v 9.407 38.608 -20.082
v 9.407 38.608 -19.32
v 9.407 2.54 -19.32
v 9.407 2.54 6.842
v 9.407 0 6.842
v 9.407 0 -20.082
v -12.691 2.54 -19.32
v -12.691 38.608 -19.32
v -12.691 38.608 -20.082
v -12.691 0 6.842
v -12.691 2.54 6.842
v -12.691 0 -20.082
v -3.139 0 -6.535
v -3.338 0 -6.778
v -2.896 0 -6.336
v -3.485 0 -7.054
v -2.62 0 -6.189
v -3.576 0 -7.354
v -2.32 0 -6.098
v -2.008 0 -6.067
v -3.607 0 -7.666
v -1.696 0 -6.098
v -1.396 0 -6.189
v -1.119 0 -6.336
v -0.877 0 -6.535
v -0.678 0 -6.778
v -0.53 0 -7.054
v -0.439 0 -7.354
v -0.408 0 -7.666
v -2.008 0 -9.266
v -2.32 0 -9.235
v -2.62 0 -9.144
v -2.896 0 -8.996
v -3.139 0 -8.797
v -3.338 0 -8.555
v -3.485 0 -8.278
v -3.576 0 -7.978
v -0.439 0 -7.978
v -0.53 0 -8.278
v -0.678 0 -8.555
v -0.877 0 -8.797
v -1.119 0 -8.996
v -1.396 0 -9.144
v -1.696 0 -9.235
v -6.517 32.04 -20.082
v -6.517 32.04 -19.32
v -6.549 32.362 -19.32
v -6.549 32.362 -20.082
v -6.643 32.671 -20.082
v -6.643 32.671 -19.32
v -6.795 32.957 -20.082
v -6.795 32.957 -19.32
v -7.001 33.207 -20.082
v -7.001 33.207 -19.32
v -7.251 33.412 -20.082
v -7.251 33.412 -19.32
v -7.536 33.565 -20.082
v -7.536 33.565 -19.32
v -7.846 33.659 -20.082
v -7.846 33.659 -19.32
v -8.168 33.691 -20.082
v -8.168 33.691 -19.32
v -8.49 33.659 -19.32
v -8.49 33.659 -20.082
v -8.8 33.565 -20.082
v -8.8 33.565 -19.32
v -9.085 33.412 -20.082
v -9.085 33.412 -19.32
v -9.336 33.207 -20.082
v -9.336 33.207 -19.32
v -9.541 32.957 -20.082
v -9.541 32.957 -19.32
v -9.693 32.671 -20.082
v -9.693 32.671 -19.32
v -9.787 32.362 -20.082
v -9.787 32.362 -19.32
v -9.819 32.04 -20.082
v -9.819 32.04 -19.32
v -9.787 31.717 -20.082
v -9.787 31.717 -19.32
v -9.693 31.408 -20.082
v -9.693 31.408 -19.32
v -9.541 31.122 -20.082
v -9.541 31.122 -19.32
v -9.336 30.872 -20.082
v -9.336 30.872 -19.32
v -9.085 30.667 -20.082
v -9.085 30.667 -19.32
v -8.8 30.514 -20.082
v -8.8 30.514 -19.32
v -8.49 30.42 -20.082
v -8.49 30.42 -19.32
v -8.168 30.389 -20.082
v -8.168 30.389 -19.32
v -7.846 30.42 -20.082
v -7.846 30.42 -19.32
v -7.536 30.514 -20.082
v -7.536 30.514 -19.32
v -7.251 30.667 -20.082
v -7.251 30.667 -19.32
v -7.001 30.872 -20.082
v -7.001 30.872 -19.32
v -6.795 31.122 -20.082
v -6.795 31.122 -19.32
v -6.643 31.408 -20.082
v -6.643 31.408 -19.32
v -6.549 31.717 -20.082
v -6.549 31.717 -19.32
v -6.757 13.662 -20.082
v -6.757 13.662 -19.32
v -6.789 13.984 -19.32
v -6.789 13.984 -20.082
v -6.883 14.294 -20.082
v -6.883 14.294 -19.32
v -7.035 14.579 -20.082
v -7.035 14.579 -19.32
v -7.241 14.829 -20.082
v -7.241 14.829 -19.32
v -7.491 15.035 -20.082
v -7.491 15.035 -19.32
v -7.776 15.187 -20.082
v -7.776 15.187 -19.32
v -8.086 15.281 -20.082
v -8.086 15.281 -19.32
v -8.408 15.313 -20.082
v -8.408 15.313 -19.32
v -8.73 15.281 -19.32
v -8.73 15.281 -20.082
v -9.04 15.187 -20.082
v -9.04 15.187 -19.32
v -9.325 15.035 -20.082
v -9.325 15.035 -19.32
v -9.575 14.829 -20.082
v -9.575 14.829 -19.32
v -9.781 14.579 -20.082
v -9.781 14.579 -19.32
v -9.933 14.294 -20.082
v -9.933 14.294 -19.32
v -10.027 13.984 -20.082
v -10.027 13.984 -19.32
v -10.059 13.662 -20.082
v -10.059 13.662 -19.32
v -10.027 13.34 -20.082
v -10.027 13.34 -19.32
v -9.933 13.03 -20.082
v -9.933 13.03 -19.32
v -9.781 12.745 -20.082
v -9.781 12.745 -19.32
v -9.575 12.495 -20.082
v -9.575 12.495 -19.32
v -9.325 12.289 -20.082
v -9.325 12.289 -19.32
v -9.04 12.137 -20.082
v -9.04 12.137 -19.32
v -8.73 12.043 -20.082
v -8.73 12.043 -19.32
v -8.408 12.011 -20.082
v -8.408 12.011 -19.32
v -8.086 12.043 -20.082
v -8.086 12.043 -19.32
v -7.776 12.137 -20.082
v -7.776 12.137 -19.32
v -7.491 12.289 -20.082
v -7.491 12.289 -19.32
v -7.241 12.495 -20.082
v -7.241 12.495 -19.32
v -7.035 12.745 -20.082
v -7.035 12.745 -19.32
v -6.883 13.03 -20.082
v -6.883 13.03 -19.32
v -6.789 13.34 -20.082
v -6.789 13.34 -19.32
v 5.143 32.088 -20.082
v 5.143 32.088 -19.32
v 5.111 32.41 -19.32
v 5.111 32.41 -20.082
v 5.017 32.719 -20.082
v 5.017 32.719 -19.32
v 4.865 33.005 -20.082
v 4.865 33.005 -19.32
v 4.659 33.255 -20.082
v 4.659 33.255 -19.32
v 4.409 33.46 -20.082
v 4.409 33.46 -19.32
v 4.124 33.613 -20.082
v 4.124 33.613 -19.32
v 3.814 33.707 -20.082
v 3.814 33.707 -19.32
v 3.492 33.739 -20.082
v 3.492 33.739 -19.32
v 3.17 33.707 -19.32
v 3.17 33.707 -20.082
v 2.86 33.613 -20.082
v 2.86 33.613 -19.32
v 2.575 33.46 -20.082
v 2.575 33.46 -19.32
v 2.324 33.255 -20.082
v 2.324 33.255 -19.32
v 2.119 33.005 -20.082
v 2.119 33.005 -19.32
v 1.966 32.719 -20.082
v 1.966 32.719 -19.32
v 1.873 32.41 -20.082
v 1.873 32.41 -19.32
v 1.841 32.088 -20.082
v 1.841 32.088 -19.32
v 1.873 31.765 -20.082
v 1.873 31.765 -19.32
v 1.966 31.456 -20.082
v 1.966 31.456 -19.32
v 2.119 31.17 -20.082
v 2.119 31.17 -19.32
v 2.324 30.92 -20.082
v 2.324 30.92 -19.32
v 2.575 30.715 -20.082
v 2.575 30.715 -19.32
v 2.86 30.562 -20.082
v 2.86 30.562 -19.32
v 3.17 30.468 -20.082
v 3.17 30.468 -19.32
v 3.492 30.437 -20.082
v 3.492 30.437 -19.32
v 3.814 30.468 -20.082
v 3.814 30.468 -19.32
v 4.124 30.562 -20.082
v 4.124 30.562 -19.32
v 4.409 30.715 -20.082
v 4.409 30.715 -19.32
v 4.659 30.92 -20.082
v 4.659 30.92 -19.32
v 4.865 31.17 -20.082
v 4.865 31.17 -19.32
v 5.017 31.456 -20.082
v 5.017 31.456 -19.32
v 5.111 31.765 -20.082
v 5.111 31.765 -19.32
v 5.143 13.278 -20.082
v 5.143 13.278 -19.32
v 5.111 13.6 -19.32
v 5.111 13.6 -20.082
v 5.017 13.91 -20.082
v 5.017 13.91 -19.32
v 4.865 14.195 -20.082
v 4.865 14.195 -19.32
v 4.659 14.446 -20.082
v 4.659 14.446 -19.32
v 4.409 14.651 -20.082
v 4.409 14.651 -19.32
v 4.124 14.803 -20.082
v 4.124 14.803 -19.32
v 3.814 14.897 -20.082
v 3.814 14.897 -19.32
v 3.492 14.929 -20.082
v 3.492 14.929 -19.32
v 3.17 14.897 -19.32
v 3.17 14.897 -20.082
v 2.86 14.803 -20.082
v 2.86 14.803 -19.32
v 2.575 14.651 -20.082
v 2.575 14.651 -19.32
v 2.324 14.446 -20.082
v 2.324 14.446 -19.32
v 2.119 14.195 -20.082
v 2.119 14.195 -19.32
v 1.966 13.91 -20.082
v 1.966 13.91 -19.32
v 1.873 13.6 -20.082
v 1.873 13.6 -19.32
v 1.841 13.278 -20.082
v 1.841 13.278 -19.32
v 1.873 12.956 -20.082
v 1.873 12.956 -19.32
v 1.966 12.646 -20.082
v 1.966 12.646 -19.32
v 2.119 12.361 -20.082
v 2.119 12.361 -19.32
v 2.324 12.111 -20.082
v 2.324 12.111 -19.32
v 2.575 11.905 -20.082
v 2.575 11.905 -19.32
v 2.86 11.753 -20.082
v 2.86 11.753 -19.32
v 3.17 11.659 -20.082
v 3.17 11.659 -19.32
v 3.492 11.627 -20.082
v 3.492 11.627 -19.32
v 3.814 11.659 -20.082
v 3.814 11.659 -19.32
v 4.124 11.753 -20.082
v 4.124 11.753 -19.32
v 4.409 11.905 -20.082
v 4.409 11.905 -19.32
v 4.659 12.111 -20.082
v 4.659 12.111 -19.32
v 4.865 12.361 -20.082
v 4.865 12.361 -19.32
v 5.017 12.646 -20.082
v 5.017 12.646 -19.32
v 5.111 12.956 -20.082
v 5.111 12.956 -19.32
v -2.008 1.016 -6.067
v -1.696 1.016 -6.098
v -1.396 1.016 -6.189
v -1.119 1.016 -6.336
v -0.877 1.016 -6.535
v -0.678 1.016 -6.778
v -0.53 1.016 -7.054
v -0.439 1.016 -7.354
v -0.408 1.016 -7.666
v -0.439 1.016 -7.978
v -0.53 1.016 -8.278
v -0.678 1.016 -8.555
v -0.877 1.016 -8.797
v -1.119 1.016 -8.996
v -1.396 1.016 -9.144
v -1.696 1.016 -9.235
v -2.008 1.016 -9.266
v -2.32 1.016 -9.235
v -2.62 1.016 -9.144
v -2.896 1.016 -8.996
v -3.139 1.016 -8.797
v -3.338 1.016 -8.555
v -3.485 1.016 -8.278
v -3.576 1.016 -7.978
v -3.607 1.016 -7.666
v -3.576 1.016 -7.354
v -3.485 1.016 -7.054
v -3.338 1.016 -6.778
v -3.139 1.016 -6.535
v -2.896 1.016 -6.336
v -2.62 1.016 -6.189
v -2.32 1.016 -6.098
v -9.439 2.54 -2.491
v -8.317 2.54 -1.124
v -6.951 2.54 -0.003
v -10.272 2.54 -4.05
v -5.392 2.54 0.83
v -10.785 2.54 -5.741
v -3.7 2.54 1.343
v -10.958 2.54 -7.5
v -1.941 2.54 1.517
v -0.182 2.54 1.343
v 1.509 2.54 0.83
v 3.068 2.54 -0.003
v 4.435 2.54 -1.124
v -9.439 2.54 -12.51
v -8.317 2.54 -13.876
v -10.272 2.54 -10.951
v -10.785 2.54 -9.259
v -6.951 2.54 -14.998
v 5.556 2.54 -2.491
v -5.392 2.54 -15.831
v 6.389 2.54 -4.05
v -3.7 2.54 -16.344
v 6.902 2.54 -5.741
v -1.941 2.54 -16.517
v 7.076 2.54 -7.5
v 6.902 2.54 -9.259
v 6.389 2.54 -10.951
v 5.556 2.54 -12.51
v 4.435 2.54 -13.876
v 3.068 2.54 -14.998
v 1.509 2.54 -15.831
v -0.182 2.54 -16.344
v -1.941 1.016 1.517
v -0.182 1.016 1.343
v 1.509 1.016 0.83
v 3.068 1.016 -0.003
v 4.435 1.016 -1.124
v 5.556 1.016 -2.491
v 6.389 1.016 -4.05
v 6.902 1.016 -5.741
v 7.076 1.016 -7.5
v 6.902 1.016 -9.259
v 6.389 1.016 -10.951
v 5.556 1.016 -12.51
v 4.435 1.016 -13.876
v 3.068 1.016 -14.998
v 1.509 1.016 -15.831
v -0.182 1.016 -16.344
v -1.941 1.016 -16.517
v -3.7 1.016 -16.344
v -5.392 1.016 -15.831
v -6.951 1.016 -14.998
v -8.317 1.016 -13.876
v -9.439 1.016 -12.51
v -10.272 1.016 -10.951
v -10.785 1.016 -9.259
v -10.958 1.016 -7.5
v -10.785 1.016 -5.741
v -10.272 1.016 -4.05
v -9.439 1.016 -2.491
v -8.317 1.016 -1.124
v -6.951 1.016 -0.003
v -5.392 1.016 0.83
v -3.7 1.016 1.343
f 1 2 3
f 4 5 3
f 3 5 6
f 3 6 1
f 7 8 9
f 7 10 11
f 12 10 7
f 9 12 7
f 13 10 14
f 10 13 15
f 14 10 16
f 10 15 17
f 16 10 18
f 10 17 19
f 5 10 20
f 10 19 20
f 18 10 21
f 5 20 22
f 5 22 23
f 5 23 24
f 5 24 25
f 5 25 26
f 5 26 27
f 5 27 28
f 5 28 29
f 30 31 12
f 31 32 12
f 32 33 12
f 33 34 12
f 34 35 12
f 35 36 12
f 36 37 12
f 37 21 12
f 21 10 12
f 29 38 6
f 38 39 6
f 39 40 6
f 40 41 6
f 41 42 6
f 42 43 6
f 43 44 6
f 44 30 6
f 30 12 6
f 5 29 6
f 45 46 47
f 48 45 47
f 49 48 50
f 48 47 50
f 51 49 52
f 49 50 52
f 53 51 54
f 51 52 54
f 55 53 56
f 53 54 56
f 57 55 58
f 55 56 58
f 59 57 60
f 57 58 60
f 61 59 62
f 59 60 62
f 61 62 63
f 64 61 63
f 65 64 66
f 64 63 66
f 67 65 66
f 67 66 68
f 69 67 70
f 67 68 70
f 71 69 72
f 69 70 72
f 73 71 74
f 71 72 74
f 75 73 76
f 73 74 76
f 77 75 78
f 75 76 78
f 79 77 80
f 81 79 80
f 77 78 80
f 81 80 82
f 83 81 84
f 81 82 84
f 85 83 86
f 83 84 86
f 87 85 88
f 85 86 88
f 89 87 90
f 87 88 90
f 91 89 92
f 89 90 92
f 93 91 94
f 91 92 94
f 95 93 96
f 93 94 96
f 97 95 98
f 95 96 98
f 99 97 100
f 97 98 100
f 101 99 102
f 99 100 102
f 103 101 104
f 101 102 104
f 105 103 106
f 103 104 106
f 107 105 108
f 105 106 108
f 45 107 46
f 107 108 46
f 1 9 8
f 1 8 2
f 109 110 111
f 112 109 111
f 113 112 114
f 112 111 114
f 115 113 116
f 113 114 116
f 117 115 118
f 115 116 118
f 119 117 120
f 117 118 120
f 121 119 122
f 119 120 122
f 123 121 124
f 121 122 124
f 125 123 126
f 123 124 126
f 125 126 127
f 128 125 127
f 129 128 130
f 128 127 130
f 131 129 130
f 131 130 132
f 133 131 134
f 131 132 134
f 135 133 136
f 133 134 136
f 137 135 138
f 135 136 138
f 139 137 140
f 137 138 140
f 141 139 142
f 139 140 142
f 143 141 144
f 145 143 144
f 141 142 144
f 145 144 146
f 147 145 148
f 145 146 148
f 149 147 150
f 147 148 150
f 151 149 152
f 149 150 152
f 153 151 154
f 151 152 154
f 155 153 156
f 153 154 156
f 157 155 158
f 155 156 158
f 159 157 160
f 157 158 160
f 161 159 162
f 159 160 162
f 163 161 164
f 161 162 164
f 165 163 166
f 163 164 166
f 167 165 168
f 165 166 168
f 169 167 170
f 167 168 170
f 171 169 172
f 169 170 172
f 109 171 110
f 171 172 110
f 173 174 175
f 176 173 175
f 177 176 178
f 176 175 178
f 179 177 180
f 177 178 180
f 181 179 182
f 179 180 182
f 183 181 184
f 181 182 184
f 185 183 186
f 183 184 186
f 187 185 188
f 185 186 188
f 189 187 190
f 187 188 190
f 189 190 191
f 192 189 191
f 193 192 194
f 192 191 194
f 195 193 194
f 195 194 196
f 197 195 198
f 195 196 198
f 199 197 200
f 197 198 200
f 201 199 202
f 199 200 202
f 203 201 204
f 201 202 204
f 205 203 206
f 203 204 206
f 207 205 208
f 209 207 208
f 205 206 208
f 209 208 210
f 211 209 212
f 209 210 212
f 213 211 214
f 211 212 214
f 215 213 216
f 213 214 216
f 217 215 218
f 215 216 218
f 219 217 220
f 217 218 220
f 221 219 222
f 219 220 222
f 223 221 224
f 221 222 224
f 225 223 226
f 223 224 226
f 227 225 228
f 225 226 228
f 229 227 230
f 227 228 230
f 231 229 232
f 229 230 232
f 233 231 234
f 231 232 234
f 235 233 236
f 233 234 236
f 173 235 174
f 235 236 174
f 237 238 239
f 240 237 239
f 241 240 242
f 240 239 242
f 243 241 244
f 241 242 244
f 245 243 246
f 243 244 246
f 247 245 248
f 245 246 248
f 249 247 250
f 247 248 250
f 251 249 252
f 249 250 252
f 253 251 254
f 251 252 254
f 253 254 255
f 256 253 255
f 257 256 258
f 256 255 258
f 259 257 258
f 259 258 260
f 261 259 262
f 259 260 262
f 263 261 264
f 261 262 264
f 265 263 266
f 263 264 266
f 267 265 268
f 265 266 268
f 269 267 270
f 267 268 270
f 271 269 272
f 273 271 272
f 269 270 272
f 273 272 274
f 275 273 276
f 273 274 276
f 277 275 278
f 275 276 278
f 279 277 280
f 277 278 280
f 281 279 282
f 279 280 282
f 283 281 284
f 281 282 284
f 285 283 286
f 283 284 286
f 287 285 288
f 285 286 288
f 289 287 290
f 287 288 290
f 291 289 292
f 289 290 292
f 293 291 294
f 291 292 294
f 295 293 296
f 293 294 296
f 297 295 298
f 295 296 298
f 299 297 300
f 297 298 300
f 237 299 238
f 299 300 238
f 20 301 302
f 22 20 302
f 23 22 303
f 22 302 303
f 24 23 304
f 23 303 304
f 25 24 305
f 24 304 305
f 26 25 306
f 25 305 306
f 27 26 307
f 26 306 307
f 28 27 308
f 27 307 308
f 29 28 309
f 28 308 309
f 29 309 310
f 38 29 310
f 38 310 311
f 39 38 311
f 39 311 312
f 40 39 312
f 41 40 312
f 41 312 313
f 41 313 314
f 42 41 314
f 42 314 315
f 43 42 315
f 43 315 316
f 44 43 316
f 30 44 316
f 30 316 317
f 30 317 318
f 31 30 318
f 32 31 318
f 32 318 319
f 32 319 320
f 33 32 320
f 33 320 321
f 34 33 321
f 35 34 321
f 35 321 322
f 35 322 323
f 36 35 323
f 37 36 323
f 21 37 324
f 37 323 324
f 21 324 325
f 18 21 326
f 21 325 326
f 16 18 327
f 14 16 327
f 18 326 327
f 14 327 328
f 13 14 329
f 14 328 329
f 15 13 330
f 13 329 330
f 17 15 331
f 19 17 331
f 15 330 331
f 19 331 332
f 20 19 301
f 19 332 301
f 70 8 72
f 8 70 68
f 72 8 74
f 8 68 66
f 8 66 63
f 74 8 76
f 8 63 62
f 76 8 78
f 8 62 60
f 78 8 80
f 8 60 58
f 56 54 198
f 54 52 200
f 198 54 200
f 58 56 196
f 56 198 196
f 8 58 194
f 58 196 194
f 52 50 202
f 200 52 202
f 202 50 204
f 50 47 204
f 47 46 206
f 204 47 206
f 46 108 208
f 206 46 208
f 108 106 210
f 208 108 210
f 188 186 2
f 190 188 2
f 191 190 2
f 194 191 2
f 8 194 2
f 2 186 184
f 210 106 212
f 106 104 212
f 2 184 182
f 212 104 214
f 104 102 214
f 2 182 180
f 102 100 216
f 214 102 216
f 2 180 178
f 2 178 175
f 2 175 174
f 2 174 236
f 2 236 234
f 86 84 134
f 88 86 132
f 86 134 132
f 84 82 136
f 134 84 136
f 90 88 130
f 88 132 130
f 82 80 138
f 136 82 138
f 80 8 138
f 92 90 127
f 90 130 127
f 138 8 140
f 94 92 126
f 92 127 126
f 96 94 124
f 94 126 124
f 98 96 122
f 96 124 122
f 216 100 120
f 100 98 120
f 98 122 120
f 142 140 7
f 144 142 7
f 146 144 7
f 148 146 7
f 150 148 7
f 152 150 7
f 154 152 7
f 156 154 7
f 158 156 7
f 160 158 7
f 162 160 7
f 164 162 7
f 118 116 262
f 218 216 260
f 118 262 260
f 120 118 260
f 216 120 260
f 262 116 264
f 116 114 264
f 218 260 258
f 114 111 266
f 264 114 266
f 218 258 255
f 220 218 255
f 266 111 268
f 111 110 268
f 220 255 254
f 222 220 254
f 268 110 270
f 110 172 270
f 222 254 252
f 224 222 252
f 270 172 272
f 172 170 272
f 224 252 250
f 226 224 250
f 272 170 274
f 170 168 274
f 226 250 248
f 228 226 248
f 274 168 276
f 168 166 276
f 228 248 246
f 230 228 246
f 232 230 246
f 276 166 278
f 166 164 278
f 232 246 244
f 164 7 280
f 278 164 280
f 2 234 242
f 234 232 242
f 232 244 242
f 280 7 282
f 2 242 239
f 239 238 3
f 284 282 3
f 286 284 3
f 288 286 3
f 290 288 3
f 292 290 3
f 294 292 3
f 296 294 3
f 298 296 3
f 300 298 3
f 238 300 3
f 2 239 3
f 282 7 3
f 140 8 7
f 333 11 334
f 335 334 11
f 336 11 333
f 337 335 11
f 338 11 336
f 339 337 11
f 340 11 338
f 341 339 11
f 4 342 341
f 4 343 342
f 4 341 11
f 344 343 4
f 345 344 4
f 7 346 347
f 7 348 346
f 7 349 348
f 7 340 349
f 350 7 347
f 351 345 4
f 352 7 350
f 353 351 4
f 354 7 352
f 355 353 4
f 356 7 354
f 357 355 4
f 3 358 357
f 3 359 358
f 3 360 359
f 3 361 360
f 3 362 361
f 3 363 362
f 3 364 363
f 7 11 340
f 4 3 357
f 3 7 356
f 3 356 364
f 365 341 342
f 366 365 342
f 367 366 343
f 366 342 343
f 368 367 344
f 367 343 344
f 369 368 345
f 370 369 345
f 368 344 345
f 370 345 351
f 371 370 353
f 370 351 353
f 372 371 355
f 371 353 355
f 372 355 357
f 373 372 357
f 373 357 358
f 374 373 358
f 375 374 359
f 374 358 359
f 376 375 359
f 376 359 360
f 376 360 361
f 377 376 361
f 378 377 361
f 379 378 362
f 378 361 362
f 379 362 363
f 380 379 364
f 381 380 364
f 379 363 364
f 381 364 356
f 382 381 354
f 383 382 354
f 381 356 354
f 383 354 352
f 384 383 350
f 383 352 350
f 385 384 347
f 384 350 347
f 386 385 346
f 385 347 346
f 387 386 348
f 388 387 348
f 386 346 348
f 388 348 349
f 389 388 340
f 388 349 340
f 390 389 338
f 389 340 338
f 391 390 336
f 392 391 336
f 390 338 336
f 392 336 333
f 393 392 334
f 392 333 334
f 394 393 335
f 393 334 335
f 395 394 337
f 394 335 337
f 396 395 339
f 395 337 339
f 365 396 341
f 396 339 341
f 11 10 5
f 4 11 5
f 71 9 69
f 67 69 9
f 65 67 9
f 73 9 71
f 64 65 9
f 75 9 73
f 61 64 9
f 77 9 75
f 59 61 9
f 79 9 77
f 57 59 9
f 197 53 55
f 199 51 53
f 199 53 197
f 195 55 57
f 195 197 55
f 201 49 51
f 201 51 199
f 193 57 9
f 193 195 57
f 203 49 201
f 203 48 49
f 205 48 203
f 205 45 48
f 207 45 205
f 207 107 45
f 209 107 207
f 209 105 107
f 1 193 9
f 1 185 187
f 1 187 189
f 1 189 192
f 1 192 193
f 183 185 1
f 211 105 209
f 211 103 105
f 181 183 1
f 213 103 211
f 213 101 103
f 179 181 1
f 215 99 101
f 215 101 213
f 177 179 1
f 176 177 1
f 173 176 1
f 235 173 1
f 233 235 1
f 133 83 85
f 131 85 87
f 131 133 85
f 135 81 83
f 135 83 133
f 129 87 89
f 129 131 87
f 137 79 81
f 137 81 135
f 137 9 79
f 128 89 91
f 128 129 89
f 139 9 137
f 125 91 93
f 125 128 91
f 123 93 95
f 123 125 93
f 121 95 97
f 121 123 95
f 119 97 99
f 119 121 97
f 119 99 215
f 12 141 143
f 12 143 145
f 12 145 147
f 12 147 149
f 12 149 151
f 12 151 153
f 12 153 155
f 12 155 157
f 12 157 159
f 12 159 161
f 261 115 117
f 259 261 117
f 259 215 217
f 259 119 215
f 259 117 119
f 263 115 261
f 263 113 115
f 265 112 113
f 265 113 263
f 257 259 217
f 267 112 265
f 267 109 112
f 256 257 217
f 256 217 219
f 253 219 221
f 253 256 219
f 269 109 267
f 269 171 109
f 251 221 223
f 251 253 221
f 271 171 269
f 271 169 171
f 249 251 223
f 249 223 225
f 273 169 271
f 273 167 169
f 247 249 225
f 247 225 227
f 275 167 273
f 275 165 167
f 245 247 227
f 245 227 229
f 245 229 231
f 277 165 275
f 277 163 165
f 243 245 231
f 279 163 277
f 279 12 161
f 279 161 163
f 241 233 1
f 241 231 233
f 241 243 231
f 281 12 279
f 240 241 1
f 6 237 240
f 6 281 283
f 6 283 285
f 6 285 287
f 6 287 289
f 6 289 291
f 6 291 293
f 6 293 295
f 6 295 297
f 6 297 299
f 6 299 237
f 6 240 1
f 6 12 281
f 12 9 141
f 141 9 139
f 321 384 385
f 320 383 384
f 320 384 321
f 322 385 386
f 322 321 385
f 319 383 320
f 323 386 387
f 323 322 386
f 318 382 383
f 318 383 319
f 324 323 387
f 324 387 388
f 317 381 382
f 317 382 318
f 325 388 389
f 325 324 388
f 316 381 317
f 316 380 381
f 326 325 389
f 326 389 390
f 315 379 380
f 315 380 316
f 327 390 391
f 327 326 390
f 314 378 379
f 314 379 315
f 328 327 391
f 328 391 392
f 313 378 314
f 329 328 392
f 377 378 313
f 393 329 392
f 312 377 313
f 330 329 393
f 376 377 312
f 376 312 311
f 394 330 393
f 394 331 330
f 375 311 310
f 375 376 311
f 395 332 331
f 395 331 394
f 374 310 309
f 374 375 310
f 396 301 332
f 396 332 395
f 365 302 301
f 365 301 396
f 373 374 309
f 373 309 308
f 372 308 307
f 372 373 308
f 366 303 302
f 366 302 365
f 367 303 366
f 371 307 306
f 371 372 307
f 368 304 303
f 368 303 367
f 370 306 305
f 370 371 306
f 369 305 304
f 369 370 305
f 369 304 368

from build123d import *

# Parameters (mm, degrees)
SKETCH1_W           = 22.098
SKETCH1_H           = 26.924
BOSS_EXTRUDE1_DEPTH = 2.54
SKETCH2_W           = 22.098
SKETCH2_H           = 0.762
BOSS_EXTRUDE2_DEPTH = 36.068
SKETCH4_R           = 1.651
CUT_EXTRUDE1_DEPTH  = 0.762
SKETCH3_R           = 9.017
CUT_EXTRUDE2_DEPTH  = 1.524
SKETCH5_R           = 1.599485458
CUT_EXTRUDE3_DEPTH  = 1.27
SKETCH6_R           = 1.651
CUT_EXTRUDE4_DEPTH  = 0.762


with BuildPart() as part:
    # Sketch1 → Boss-Extrude1 (new body)
    with BuildSketch(Plane(origin=(0, 0, 0), x_dir=(1, 0, 0), z_dir=(0, 1, 0))):
        with Locations((-1.642418919, 6.620304054)):
            Rectangle(SKETCH1_W, SKETCH1_H)
    extrude(amount=BOSS_EXTRUDE1_DEPTH)

    # Sketch2 → Boss-Extrude2 (add)
    with BuildSketch(Plane(origin=(0, 2.54, 0), x_dir=(1, 0, 0), z_dir=(0, 1, 0))):
        with Locations((-1.642418919, 19.701304054)):
            Rectangle(SKETCH2_W, SKETCH2_H)
    extrude(amount=BOSS_EXTRUDE2_DEPTH)

    # Sketch4 → Cut-Extrude1 (cut)
    with BuildSketch(Plane.XY.offset(-19.320304054)):
        with Locations((-8.168147535, 32.039555002)):
            Circle(SKETCH4_R)
    extrude(amount=-CUT_EXTRUDE1_DEPTH, mode=Mode.SUBTRACT)

    # Sketch3 → Cut-Extrude2 (cut)
    with BuildSketch(Plane(origin=(0, 2.54, 0), x_dir=(1, 0, 0), z_dir=(0, 1, 0))):
        with Locations(Location((-1.941286503, 7.500303052, 0), (0, 0, 270))):
            Circle(SKETCH3_R)
    extrude(amount=-CUT_EXTRUDE2_DEPTH, mode=Mode.SUBTRACT)

    # Sketch5 → Cut-Extrude3 (cut)
    with BuildSketch(Plane(origin=(0, 1.016, 0), x_dir=(1, 0, 0), z_dir=(0, 1, 0))):
        with Locations(Location((-2.007701522, 7.666340599, 0), (0, 0, 270))):
            Circle(SKETCH5_R)
    extrude(amount=-CUT_EXTRUDE3_DEPTH, mode=Mode.SUBTRACT)

    # Sketch6 → Cut-Extrude4 (cut)
    with BuildSketch(Plane.XY.offset(-19.320304054)):
        with Locations((3.491794036, 32.087538301)):
            Circle(SKETCH6_R)
        with Locations((-8.408064028, 13.661951621)):
            Circle(SKETCH6_R)
        with Locations((3.491794036, 13.278085232)):
            Circle(SKETCH6_R)
    extrude(amount=-CUT_EXTRUDE4_DEPTH, mode=Mode.SUBTRACT)


solid = part.part
